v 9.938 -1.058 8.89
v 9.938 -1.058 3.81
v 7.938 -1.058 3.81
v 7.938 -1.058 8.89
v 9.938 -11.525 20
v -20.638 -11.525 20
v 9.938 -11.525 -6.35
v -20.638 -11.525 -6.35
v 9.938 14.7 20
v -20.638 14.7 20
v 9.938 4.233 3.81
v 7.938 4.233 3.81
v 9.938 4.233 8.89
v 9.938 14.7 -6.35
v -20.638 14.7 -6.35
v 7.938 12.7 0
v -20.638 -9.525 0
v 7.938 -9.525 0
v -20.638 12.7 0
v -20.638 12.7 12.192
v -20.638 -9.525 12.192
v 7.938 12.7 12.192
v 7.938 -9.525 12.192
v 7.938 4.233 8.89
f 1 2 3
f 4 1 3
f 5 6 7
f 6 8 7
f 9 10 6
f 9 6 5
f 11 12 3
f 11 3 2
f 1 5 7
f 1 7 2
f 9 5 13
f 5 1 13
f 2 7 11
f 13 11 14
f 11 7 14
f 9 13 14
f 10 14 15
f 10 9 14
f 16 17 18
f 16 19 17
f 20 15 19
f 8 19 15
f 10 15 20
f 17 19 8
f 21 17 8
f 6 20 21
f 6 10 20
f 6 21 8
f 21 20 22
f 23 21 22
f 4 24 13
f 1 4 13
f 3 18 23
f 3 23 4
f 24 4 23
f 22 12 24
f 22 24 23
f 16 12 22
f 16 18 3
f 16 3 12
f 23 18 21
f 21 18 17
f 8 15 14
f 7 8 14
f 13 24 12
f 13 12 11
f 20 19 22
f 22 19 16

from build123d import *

# Parameters (mm, degrees)
F1_START      = 12.192
F1_DEPTH      = 7.808
F2_DEPTH      = 6.35
F3_DEPTH      = 20
F3_DEPTH_BACK = 6.35
F0_W          = 2
F0_H          = 5.2916666667
F4_DEPTH      = 6.35
F4_DEPTH_BACK = 3.81
F5_START      = 8.89
F5_DEPTH      = 11.11


with BuildPart() as f1:
    # F0 (on Top) → F1 (new body)
    with BuildSketch(Plane.XY.offset(F1_START)):
        Polygon((7.9375, 12.7), (-20.6375, 12.7), (-20.6375, -9.525), (7.9375, -9.525), (7.9375, -1.0583333333), (7.9375, 4.2333333333), align=None)
    extrude(amount=F1_DEPTH)



with BuildPart() as f2:
    # F0 (on Top) → F2 (new body)
    with BuildSketch(Plane.XY):
        Polygon((7.9375, 12.7), (-20.6375, 12.7), (-20.6375, -9.525), (7.9375, -9.525), (7.9375, -1.0583333333), (7.9375, 4.2333333333), align=None)
    extrude(amount=-F2_DEPTH)


with BuildPart() as f1_1:
    add(f1.part)

    add(f2.part)  # F3 merges F2
    # F0 (on Top) → F3 (join, two sides)
    with BuildSketch(Plane.XY) as f3_sk:
        Polygon((9.9375, 14.7), (-20.6375, 14.7), (-20.6375, 12.7), (7.9375, 12.7), (7.9375, 4.2333333333), (9.9375, 4.2333333333), align=None)
        Polygon((7.9375, -9.525), (-20.6375, -9.525), (-20.6375, -11.525), (9.9375, -11.525), (9.9375, -1.0583333333), (7.9375, -1.0583333333), align=None)
    extrude(amount=F3_DEPTH)
    extrude(f3_sk.sketch, amount=-F3_DEPTH_BACK)

    # F0 (on Top) → F4 (join, two sides)
    with BuildSketch(Plane.XY) as f4_sk:
        with Locations((8.9375, 1.5875)):
            Rectangle(F0_W, F0_H)
    extrude(amount=-F4_DEPTH)
    extrude(f4_sk.sketch, amount=F4_DEPTH_BACK)

    # F0 (on Top) → F5 (join)
    with BuildSketch(Plane.XY.offset(F5_START)):
        with Locations((8.9375, 1.5875)):
            Rectangle(F0_W, F0_H)
    extrude(amount=F5_DEPTH)


solid = f1_1.part
